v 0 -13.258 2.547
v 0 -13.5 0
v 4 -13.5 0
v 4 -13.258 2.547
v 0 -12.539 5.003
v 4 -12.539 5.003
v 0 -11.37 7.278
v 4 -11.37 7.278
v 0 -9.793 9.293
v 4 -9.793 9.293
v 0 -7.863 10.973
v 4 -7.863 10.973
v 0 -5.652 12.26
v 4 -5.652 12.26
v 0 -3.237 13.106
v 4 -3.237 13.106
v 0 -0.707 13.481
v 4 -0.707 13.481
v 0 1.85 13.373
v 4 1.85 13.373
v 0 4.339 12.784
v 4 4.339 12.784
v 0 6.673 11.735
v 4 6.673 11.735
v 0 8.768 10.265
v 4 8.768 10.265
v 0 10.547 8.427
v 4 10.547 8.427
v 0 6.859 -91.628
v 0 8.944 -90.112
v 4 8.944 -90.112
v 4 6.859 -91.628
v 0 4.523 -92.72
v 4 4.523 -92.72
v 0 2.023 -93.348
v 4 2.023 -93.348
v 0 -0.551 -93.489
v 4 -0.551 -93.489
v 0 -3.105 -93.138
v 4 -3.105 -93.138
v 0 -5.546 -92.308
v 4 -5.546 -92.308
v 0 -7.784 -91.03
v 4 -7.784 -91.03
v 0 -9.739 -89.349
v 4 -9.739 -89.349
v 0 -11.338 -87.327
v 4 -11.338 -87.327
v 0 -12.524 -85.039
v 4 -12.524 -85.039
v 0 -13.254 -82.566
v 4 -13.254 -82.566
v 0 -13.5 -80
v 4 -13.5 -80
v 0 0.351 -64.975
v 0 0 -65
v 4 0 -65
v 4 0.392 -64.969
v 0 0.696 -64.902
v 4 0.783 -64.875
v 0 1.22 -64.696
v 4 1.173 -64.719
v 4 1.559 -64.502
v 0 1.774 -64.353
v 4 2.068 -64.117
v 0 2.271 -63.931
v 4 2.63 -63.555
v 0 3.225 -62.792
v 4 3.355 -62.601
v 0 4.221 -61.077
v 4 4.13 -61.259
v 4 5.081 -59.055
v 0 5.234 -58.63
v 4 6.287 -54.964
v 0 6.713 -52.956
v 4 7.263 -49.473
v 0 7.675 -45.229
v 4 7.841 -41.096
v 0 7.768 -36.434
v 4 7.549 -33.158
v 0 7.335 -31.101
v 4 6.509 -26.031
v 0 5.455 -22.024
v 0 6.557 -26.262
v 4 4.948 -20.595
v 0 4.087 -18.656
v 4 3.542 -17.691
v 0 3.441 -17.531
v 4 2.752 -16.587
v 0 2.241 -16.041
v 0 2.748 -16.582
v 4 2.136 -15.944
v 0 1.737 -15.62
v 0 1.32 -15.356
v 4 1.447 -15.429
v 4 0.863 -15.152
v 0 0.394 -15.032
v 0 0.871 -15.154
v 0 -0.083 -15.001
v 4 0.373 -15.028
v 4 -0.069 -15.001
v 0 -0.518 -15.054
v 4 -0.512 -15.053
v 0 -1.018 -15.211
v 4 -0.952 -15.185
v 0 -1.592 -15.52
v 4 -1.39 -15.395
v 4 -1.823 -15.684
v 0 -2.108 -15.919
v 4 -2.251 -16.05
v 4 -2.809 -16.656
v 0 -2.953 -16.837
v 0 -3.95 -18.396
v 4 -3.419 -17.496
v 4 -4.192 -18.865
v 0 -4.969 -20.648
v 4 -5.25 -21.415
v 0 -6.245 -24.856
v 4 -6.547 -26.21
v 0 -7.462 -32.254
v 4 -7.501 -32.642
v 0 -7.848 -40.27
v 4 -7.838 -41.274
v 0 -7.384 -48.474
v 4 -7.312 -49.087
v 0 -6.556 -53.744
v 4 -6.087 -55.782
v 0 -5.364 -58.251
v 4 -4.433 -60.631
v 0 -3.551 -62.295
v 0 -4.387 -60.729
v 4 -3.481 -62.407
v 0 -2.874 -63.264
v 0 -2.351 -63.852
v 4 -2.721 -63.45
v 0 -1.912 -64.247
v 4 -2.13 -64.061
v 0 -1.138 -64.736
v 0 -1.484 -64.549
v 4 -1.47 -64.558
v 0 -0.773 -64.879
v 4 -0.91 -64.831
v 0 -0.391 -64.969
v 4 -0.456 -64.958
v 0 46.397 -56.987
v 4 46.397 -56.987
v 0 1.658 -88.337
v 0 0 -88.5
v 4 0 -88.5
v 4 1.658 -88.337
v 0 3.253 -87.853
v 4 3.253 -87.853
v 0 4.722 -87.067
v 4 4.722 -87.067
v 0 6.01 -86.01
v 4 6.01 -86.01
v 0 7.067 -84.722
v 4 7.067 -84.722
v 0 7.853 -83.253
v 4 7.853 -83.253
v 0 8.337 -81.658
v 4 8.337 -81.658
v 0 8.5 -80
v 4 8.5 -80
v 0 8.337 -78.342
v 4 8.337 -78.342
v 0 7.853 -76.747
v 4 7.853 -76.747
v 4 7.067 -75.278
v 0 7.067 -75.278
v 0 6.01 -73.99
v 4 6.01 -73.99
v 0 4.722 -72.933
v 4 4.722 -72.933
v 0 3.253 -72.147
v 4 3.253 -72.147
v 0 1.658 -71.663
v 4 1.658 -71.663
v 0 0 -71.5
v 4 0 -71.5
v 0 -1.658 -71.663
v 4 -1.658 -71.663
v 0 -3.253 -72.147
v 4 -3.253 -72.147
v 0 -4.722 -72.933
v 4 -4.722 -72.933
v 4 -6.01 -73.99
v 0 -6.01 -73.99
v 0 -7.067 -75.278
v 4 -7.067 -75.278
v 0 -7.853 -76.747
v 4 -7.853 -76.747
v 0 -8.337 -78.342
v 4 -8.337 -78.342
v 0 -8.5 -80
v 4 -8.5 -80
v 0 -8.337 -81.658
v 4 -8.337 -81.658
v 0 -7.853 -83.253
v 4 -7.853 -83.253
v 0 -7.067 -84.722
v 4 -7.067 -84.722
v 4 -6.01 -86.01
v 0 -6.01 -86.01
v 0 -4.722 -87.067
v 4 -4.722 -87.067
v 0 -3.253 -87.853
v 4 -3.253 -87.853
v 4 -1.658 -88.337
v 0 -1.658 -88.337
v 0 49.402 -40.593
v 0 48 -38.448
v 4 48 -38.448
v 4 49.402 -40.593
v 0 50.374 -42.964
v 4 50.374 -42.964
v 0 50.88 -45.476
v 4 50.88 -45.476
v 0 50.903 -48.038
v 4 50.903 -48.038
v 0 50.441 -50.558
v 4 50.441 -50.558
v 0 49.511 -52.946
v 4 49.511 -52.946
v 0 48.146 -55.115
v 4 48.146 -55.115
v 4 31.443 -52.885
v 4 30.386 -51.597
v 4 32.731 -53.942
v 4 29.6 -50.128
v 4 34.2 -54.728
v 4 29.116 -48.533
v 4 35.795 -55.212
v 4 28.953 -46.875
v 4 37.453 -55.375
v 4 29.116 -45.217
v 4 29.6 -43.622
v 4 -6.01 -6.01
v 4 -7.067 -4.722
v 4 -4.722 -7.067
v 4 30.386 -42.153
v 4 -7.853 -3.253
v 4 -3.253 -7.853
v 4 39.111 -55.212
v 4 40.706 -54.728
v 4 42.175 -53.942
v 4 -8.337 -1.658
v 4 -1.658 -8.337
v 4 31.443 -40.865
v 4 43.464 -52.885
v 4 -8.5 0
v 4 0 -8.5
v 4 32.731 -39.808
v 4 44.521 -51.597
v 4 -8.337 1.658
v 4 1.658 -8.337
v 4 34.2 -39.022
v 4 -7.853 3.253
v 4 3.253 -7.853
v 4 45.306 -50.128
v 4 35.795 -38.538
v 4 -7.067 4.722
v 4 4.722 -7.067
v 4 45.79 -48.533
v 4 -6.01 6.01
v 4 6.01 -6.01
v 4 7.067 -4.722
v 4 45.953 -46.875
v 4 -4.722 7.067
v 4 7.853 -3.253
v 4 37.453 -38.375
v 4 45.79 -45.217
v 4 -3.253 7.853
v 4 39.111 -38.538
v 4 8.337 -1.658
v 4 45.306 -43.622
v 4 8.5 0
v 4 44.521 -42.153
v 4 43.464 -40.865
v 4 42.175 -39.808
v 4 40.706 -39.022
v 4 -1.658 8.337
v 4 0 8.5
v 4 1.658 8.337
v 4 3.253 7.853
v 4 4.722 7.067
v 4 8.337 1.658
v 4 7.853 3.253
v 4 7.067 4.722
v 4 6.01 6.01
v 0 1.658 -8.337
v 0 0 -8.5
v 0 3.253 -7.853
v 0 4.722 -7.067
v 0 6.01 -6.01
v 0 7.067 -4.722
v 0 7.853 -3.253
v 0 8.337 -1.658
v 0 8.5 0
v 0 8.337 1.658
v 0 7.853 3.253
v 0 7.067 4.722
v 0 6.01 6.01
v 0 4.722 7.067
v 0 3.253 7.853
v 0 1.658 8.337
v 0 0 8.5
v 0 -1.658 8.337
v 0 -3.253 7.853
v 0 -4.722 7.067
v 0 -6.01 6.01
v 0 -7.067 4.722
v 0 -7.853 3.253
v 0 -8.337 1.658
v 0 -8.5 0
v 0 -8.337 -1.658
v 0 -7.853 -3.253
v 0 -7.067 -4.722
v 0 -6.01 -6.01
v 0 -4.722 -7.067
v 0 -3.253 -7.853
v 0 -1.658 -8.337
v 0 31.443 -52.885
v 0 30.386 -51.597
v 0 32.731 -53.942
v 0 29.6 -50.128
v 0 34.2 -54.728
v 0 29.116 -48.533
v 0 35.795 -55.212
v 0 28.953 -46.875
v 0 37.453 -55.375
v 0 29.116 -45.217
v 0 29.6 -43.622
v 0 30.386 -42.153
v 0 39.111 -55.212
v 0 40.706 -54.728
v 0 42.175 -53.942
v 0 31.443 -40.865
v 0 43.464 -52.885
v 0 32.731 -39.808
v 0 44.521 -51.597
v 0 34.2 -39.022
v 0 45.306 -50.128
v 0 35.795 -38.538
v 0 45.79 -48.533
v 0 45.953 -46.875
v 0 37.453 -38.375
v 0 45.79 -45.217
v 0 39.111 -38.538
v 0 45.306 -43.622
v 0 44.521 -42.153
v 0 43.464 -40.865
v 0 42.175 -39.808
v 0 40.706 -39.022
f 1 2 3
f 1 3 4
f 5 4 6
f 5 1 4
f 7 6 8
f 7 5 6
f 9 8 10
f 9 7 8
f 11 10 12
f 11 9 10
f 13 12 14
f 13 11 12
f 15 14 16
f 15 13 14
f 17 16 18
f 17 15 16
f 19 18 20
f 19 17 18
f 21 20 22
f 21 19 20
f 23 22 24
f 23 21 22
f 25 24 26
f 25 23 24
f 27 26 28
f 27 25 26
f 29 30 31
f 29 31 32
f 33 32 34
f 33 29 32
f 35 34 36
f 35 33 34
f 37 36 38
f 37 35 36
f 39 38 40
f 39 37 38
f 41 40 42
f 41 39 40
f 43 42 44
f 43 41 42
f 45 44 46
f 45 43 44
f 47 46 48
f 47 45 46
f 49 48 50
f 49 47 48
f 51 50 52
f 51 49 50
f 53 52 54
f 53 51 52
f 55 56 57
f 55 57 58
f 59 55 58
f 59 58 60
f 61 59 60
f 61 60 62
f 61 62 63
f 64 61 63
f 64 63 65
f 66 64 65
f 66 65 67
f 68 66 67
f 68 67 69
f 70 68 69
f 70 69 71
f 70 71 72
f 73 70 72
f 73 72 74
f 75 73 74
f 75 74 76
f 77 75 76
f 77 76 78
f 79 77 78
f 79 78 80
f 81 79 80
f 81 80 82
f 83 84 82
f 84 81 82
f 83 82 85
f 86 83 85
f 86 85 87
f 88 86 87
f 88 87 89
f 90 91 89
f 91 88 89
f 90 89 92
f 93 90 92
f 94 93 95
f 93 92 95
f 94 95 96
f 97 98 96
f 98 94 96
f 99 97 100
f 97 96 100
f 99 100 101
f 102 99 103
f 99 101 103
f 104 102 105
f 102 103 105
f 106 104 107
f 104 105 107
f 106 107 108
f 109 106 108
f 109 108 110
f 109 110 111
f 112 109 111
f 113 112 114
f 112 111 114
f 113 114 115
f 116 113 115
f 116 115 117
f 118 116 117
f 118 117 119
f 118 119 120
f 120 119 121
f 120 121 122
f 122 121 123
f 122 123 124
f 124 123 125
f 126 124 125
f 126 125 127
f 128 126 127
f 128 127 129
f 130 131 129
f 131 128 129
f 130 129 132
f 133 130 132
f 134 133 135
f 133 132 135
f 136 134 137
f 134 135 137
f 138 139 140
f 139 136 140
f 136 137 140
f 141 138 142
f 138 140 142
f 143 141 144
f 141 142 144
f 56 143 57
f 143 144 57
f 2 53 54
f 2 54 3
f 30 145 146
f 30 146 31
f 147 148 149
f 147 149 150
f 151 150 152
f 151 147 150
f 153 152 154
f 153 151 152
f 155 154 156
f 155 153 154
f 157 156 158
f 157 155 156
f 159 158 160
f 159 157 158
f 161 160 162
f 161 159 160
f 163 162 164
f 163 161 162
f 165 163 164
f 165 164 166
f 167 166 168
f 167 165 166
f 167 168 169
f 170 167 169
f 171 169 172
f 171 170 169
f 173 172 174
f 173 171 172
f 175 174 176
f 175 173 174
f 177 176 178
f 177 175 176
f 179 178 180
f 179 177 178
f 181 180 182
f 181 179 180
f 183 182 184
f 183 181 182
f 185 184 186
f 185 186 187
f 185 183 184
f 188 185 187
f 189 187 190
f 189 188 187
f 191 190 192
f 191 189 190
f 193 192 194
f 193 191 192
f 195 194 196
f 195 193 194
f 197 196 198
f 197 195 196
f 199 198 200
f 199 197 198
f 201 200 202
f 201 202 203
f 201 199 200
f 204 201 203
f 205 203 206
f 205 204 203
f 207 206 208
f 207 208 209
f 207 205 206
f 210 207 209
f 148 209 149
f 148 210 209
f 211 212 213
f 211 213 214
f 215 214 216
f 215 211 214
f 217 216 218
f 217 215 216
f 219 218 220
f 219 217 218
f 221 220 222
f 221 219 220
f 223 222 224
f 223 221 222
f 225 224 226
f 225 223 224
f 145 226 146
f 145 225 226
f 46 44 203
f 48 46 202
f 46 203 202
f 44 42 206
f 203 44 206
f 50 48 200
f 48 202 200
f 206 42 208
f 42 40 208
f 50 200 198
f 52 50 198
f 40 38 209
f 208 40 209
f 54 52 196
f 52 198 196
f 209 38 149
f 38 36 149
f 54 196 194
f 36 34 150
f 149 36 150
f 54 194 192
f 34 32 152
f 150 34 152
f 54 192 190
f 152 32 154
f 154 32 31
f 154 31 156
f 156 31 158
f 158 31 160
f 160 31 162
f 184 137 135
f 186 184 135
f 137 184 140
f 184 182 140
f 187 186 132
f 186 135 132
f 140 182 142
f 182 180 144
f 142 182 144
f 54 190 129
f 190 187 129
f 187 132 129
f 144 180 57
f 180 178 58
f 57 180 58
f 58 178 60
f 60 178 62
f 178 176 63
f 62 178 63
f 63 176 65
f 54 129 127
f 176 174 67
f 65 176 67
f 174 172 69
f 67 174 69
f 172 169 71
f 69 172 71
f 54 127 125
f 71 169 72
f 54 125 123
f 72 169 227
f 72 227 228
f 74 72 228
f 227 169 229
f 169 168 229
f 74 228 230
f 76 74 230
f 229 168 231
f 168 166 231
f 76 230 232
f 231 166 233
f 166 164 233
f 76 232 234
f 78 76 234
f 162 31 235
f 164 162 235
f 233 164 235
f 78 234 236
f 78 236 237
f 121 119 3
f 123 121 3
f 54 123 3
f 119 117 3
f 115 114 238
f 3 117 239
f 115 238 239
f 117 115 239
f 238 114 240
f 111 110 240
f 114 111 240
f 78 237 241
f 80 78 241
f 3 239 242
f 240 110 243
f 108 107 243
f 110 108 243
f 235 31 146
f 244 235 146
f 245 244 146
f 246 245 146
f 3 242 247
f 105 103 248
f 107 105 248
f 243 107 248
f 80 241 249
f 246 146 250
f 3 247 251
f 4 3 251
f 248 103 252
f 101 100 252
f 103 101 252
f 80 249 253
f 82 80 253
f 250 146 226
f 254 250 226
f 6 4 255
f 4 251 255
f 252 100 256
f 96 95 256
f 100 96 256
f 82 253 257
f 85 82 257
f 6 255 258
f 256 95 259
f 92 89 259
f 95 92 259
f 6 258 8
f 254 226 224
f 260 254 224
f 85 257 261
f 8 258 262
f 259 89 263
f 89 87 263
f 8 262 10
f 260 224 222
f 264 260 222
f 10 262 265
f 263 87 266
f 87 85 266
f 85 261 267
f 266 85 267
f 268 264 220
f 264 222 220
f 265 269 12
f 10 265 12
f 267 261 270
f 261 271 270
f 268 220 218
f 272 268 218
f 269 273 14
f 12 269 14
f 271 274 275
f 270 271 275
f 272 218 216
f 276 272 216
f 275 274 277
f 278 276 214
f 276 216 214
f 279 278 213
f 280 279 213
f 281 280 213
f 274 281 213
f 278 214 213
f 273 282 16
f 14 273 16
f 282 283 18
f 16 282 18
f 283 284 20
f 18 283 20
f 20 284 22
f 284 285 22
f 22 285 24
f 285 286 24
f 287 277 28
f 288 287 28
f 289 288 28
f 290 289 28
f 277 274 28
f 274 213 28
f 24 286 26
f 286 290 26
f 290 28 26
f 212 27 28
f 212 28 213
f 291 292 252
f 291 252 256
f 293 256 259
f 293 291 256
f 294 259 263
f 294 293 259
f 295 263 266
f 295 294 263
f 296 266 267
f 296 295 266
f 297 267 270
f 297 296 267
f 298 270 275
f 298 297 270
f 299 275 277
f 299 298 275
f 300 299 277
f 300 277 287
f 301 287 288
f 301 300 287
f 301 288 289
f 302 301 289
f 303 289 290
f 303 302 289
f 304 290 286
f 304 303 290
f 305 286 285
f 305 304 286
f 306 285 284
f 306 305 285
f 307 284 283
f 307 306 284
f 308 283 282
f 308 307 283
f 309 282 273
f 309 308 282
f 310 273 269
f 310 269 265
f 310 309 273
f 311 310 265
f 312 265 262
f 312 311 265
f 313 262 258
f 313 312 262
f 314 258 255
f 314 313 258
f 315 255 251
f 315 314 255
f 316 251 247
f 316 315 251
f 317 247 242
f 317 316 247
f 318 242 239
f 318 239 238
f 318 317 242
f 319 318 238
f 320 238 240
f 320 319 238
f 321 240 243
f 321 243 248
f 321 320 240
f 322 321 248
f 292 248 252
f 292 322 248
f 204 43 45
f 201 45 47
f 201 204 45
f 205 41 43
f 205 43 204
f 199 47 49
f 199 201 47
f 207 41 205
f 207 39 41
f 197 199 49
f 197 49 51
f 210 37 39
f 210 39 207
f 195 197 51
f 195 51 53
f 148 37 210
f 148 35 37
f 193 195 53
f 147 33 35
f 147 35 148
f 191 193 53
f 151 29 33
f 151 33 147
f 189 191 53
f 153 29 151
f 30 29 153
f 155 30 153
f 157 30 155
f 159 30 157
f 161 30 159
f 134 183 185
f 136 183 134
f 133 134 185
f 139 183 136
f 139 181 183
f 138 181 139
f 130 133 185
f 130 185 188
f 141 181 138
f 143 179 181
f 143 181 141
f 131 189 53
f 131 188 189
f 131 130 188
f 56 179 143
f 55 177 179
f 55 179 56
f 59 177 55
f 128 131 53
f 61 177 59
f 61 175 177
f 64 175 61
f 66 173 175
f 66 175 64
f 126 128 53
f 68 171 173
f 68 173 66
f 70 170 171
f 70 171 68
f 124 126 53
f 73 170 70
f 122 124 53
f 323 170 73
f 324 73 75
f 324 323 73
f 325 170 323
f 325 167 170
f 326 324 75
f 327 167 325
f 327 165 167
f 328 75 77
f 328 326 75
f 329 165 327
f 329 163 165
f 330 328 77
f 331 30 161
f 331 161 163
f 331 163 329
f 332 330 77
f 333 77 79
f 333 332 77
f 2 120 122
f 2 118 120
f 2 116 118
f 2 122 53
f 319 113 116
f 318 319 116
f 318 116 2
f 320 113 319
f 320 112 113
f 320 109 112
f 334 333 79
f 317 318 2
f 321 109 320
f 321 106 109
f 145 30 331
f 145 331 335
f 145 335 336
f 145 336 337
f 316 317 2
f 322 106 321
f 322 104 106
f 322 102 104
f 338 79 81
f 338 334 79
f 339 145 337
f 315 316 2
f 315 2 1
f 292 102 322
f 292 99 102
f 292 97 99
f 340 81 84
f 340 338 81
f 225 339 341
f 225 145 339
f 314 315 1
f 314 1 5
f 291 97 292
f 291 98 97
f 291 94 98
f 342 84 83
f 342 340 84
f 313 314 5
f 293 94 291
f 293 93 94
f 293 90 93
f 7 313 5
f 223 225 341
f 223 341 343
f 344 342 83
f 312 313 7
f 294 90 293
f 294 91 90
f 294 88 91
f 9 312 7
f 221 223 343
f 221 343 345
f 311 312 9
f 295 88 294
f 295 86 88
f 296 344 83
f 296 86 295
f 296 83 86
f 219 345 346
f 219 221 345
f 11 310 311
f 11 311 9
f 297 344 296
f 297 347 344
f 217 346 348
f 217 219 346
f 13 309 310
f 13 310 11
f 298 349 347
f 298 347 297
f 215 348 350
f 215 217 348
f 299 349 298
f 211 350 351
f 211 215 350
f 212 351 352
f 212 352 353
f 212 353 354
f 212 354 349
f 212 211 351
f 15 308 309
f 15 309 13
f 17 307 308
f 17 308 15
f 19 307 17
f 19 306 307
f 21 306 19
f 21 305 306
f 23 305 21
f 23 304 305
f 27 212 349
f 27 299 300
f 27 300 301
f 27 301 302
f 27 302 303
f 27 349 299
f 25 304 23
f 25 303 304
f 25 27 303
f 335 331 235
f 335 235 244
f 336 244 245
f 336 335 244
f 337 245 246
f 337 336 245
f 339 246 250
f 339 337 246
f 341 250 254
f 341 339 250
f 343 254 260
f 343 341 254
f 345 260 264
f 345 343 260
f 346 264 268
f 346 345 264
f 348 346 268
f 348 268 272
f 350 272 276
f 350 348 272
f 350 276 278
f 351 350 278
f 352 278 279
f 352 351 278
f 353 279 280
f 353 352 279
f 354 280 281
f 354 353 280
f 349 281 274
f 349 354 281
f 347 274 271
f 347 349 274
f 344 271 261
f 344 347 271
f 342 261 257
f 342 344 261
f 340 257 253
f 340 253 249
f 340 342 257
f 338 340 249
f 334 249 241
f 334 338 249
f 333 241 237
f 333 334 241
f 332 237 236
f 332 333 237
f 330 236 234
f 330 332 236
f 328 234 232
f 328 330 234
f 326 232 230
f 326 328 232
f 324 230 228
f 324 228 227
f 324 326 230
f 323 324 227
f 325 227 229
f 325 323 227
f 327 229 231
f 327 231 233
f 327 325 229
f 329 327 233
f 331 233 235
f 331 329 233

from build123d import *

# Parameters (mm, degrees)
SKETCH_2_R          = 8.5
EXTRUDE_1_DEPTH     = 4
SKETCH_3_RX         = 25
SKETCH_3_RY         = 7.848678542
CUT_EXTRUDE_1_DEPTH = 10


with BuildPart() as part:
    # 草图2 → 凸台-拉伸1 (new body)
    with BuildSketch(Plane(origin=(0, 0, 0), x_dir=(0, 0, -1), z_dir=(1, 0, 0))):
        with BuildLine():
            ThreePointArc((38.448053475, 47.999970666), (48.038029113, 50.902904709), (56.98733583, 46.396845666))
            Line((56.98733583, 46.396845666), (90.11233583, 8.94375))
            ThreePointArc((90.11233583, 8.94375), (92.308343207, -5.545690895), (80, -13.5))
            Line((80, -13.5), (0, -13.5))
            ThreePointArc((0, -13.5), (-12.74034561, -4.464705337), (-8.426946525, 10.546875))
            Line((-8.426946525, 10.546875), (38.448053475, 47.999970666))
        make_face()
        with Locations((80, 0)):
            Circle(SKETCH_2_R, mode=Mode.SUBTRACT)
        with Locations((46.875, 37.453095666)):
            Circle(SKETCH_2_R, mode=Mode.SUBTRACT)
        Circle(SKETCH_2_R, mode=Mode.SUBTRACT)
    extrude(amount=EXTRUDE_1_DEPTH)

    # 草图3 → 切除-拉伸1 (cut)
    with BuildSketch(Plane(origin=(4, 0, 0), x_dir=(0, 0, -1), z_dir=(1, 0, 0))):
        with Locations((40, 0)):
            Ellipse(SKETCH_3_RX, SKETCH_3_RY)
    extrude(amount=-CUT_EXTRUDE_1_DEPTH, mode=Mode.SUBTRACT)


solid = part.part
